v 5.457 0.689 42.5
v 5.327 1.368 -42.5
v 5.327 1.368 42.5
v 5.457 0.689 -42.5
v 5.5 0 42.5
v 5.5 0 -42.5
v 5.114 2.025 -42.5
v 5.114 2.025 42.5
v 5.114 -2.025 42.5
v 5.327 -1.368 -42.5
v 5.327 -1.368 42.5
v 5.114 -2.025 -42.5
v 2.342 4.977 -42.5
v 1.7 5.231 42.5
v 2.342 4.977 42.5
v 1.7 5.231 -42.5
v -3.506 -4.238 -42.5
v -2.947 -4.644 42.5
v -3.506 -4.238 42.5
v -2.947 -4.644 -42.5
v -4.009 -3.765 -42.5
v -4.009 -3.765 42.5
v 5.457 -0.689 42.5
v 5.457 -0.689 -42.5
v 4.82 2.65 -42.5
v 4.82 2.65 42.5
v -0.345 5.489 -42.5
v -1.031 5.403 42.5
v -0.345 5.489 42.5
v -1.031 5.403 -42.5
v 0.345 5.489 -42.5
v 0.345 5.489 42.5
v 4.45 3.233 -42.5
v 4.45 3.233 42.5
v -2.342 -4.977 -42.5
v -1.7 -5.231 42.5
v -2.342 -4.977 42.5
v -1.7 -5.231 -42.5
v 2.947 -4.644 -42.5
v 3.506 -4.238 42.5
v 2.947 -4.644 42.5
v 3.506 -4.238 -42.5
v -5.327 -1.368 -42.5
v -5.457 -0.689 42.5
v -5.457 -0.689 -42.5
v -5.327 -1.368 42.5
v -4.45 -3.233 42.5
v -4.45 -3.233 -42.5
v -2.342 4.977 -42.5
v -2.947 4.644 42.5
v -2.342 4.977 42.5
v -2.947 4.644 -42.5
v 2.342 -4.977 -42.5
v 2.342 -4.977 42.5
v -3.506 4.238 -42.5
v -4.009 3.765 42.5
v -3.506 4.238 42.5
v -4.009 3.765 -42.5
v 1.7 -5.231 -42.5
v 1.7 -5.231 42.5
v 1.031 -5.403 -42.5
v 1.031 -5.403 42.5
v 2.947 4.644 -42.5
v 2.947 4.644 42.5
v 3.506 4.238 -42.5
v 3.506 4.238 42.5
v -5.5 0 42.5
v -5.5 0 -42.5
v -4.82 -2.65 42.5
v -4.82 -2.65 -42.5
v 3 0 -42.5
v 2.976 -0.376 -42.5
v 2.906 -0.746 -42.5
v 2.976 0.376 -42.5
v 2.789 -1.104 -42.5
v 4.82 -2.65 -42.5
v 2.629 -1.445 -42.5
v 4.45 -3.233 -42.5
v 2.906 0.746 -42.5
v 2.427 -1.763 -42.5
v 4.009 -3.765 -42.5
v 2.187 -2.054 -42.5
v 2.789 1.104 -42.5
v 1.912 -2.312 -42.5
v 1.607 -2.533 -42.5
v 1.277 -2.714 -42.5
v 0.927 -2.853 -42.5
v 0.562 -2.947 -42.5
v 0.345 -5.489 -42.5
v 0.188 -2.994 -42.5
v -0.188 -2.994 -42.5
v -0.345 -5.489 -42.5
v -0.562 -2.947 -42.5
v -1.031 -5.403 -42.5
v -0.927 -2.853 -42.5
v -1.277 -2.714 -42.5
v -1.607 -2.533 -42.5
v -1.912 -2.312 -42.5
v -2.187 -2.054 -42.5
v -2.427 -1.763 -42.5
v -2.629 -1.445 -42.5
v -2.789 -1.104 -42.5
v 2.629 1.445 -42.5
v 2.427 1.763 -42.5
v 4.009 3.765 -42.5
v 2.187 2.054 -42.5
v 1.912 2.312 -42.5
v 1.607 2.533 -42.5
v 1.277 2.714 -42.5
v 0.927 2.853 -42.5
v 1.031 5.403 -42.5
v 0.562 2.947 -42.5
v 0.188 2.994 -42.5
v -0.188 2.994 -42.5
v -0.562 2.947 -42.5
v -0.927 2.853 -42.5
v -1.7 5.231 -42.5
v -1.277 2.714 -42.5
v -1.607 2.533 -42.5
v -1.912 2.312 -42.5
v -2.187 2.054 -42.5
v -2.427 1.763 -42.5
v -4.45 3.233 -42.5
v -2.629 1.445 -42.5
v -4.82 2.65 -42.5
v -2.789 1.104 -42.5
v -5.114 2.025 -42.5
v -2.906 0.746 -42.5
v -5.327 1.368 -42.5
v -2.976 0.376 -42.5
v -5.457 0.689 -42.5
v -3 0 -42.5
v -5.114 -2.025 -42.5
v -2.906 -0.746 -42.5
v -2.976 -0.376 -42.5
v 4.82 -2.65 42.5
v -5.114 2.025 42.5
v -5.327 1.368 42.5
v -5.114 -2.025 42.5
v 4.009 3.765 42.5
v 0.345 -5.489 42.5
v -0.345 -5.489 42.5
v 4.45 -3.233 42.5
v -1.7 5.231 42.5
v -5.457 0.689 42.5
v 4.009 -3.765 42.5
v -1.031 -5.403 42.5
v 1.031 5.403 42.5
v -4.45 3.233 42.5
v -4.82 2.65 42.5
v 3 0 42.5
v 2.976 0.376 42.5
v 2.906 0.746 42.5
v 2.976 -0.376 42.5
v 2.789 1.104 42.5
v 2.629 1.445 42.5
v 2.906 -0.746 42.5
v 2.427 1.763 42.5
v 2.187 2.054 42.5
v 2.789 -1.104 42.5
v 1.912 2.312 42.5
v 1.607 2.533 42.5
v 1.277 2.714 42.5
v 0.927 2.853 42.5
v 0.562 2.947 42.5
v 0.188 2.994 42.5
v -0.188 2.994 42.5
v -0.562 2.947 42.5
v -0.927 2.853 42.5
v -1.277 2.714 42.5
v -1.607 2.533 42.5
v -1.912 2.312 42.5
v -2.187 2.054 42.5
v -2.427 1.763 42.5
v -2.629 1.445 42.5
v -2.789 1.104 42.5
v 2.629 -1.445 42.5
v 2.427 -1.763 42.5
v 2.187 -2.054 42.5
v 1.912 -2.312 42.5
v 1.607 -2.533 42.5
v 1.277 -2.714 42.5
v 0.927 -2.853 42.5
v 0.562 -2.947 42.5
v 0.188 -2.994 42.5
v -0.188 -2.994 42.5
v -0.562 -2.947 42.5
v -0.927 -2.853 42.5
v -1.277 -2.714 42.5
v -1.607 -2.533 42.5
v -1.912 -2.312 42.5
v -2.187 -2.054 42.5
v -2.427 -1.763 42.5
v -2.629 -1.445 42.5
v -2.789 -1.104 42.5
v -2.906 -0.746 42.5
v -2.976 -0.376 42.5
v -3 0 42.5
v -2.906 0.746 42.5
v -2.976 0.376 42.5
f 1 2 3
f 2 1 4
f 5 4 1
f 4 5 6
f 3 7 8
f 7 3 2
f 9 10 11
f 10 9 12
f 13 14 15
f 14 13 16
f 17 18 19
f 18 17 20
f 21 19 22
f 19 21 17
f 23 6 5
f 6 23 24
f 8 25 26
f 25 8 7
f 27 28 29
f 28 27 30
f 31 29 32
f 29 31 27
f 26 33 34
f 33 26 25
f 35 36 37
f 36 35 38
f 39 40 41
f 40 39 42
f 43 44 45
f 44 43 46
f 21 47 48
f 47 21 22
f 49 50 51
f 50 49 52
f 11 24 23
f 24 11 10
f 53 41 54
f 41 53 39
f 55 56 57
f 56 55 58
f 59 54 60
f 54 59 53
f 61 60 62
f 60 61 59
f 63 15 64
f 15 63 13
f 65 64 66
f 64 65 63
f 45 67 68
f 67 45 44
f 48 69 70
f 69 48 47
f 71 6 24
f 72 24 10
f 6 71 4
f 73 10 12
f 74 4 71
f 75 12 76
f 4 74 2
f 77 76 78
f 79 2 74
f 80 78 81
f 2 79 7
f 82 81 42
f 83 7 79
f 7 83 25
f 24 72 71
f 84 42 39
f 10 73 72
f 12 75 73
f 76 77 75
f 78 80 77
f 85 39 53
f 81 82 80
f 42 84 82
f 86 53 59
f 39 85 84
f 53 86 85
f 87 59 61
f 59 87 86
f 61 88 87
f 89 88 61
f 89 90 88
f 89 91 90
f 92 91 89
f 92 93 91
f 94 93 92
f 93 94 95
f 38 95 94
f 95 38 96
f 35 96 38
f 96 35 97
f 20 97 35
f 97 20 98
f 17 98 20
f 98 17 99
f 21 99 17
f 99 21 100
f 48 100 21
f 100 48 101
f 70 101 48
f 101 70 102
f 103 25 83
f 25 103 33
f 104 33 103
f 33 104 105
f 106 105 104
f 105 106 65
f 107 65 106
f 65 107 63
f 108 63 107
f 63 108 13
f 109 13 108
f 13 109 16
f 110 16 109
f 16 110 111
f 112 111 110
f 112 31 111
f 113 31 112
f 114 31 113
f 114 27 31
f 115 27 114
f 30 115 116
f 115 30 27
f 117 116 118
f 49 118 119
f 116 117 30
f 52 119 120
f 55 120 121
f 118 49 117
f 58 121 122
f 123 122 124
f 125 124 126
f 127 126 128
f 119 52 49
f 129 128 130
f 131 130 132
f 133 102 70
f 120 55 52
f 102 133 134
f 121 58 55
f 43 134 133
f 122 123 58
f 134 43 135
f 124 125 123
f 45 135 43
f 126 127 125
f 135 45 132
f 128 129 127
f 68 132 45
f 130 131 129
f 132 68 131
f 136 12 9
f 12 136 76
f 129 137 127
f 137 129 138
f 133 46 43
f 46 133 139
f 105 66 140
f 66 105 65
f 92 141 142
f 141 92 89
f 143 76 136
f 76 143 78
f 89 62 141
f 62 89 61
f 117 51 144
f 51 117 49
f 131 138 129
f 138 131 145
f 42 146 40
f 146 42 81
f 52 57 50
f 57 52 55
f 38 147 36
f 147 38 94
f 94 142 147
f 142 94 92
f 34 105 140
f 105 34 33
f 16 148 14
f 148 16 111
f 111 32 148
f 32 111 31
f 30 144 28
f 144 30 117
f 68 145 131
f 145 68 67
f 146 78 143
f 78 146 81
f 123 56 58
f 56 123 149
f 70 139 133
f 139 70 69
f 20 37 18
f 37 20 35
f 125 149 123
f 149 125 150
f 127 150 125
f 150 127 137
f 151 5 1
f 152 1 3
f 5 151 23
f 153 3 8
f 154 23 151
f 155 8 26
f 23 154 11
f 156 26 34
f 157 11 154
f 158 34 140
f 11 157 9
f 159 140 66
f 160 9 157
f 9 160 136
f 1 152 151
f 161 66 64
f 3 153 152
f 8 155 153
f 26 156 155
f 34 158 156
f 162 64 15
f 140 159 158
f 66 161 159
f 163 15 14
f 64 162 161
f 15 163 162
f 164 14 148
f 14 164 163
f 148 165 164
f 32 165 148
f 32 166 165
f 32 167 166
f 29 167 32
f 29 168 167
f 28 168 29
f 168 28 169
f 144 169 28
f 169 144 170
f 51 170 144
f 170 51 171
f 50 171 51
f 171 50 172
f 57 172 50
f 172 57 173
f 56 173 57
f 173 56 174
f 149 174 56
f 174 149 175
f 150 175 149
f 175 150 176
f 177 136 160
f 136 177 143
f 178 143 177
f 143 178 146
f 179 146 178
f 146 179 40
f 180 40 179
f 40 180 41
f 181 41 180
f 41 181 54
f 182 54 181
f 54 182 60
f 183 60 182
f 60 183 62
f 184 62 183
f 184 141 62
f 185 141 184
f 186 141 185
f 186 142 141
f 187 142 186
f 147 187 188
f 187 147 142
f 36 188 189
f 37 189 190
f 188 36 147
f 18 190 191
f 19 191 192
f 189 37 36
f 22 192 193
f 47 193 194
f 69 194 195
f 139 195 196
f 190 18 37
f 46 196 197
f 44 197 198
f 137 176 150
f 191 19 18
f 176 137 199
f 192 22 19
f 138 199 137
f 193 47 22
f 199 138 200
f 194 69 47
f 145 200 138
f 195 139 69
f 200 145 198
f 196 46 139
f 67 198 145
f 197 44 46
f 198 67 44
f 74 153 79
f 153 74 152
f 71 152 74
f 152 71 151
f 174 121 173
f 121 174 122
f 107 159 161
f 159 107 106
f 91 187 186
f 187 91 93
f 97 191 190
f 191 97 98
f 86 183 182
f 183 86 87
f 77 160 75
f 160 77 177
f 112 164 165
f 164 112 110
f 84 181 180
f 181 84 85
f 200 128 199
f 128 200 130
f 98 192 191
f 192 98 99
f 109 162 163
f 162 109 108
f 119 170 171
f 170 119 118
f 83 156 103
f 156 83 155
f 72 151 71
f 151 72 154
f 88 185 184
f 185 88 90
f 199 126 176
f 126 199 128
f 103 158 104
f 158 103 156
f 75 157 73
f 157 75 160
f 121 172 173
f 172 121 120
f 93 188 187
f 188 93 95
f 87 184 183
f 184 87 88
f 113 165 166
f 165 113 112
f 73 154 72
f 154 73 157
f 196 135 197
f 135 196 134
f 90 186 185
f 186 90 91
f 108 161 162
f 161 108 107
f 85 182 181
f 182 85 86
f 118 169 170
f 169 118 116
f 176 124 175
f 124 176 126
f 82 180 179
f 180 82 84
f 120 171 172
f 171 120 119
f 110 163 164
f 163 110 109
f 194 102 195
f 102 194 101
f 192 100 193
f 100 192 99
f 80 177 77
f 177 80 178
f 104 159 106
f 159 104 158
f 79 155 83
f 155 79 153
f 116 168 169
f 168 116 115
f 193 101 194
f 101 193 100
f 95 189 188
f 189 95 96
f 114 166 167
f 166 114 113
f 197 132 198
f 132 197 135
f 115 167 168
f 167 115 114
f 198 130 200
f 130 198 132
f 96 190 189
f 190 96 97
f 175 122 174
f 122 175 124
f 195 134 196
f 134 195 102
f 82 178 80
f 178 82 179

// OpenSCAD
$fn = 50;


difference() {
	union() {
		translate(v = [0, 0, -42.5000000000]) {
			cylinder(h = 85, r = 5.5000000000);
		}
	}
	union() {
		translate(v = [0, 0, -100.0000000000]) {
			cylinder(h = 200, r = 3.0000000000);
		}
	}
}
